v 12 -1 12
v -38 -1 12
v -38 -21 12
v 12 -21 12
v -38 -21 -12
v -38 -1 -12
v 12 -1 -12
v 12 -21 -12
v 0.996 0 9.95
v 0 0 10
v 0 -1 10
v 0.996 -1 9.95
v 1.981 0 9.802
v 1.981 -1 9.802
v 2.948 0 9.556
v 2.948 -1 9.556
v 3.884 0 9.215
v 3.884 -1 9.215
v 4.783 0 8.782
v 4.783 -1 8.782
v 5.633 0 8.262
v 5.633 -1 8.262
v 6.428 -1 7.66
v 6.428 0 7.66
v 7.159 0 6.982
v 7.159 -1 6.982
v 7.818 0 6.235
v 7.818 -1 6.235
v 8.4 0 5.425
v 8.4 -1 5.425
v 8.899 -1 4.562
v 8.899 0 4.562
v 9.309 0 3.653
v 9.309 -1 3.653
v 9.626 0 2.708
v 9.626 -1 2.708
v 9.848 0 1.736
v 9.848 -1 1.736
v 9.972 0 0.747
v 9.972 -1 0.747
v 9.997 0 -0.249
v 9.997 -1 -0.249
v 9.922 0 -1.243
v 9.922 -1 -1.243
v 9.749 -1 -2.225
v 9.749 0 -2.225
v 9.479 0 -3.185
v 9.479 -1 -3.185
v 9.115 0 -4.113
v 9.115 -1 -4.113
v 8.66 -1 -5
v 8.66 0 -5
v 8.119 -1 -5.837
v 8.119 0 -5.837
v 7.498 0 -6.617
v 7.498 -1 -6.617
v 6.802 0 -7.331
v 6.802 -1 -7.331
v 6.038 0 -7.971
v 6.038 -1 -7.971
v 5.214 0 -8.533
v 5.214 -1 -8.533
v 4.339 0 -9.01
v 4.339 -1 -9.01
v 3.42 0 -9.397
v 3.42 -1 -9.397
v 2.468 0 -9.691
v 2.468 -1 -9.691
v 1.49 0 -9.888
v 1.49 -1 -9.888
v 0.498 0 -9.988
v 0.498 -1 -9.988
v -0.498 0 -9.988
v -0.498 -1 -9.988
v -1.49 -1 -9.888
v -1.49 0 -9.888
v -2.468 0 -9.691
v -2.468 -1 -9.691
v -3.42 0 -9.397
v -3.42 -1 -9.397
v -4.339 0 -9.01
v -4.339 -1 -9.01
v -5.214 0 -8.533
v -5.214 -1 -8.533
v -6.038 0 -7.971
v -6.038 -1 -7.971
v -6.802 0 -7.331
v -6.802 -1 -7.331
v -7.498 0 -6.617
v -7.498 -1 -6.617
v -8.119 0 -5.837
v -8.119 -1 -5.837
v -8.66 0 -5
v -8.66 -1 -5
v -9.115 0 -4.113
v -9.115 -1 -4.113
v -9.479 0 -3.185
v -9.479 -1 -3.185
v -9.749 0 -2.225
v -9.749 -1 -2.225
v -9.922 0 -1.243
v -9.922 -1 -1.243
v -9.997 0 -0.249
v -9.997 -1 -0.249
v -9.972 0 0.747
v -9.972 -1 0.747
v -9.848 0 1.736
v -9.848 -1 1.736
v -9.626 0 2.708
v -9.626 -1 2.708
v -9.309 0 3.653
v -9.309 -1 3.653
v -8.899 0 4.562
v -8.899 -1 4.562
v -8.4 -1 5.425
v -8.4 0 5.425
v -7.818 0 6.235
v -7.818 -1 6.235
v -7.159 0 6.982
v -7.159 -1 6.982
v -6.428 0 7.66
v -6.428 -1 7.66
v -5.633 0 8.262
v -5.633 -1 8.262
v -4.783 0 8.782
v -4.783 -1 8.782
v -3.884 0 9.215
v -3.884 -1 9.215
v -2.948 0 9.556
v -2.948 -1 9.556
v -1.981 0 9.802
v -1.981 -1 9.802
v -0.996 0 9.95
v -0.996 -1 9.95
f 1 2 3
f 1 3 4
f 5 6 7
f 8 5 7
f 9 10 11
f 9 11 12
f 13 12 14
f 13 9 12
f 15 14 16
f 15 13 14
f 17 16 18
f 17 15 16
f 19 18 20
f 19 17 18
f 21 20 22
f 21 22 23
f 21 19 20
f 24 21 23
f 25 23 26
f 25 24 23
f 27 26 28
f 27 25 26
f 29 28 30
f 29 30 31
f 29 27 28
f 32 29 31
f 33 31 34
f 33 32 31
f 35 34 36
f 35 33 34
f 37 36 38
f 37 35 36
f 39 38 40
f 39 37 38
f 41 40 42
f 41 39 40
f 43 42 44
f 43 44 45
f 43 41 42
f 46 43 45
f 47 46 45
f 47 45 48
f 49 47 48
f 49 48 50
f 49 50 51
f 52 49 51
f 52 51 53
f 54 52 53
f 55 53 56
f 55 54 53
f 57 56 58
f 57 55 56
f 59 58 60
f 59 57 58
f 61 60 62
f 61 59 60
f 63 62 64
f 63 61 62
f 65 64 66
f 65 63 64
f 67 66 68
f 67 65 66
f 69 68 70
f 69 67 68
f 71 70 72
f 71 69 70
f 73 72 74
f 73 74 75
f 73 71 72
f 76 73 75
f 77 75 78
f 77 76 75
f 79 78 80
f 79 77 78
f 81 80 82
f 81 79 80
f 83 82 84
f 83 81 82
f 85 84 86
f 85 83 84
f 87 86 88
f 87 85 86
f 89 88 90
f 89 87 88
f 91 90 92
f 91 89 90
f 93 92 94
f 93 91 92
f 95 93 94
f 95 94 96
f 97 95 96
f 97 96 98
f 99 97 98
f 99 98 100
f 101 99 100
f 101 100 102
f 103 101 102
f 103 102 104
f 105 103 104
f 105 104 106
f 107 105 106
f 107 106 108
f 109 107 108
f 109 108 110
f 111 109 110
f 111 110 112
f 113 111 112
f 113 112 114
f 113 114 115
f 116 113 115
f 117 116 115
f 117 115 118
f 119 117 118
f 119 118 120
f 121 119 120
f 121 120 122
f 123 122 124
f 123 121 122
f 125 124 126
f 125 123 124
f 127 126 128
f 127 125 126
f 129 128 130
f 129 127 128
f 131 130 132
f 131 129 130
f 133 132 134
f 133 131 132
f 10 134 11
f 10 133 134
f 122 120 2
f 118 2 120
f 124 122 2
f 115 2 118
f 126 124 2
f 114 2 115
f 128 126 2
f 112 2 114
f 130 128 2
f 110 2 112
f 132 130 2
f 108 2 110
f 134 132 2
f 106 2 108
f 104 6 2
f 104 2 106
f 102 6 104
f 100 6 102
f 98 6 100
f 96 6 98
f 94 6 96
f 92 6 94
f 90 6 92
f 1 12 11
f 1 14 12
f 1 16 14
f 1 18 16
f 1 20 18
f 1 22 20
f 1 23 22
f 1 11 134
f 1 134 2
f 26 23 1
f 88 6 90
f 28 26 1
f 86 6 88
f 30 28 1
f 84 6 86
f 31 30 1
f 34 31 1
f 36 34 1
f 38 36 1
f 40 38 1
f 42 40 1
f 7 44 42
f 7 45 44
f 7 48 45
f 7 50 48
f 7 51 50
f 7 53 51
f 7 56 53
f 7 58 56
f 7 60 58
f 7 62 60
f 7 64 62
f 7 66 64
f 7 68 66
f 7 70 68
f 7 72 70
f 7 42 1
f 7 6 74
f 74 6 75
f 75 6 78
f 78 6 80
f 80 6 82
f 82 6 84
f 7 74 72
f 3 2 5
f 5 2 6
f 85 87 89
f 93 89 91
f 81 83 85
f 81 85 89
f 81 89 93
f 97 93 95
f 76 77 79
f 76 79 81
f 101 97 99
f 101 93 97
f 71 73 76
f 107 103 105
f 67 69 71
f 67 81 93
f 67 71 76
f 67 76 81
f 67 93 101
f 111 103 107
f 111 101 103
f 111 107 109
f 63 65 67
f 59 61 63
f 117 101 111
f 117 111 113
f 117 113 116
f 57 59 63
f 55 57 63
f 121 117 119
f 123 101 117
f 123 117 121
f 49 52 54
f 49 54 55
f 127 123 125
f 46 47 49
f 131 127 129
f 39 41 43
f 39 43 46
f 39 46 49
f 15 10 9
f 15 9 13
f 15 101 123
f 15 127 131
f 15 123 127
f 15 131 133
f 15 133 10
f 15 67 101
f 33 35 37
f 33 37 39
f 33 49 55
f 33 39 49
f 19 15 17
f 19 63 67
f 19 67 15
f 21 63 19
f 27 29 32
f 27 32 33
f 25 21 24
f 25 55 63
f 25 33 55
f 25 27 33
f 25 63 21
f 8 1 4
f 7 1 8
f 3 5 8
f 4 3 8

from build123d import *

# Parameters (mm, degrees)
SKETCH2_R           = 10
BOSS_EXTRUDE1_DEPTH = 1
SKETCH4_W           = 50
SKETCH4_H           = 24
BOSS_EXTRUDE2_DEPTH = 20


with BuildPart() as part:
    # Sketch2 → Boss-Extrude1 (new body)
    with BuildSketch(Plane(origin=(0, 0, 0), x_dir=(1, 0, 0), z_dir=(0, 1, 0))):
        with Locations(Location((0, 0, 0), (0, 0, 270))):
            Circle(SKETCH2_R)
    extrude(amount=-BOSS_EXTRUDE1_DEPTH)

    # Sketch4 → Boss-Extrude2 (add)
    with BuildSketch(Plane(origin=(0, -1, 0), x_dir=(1, 0, 0), z_dir=(0, 1, 0))):
        with Locations((-13, 0)):
            Rectangle(SKETCH4_W, SKETCH4_H)
    extrude(amount=-BOSS_EXTRUDE2_DEPTH)


solid = part.part
